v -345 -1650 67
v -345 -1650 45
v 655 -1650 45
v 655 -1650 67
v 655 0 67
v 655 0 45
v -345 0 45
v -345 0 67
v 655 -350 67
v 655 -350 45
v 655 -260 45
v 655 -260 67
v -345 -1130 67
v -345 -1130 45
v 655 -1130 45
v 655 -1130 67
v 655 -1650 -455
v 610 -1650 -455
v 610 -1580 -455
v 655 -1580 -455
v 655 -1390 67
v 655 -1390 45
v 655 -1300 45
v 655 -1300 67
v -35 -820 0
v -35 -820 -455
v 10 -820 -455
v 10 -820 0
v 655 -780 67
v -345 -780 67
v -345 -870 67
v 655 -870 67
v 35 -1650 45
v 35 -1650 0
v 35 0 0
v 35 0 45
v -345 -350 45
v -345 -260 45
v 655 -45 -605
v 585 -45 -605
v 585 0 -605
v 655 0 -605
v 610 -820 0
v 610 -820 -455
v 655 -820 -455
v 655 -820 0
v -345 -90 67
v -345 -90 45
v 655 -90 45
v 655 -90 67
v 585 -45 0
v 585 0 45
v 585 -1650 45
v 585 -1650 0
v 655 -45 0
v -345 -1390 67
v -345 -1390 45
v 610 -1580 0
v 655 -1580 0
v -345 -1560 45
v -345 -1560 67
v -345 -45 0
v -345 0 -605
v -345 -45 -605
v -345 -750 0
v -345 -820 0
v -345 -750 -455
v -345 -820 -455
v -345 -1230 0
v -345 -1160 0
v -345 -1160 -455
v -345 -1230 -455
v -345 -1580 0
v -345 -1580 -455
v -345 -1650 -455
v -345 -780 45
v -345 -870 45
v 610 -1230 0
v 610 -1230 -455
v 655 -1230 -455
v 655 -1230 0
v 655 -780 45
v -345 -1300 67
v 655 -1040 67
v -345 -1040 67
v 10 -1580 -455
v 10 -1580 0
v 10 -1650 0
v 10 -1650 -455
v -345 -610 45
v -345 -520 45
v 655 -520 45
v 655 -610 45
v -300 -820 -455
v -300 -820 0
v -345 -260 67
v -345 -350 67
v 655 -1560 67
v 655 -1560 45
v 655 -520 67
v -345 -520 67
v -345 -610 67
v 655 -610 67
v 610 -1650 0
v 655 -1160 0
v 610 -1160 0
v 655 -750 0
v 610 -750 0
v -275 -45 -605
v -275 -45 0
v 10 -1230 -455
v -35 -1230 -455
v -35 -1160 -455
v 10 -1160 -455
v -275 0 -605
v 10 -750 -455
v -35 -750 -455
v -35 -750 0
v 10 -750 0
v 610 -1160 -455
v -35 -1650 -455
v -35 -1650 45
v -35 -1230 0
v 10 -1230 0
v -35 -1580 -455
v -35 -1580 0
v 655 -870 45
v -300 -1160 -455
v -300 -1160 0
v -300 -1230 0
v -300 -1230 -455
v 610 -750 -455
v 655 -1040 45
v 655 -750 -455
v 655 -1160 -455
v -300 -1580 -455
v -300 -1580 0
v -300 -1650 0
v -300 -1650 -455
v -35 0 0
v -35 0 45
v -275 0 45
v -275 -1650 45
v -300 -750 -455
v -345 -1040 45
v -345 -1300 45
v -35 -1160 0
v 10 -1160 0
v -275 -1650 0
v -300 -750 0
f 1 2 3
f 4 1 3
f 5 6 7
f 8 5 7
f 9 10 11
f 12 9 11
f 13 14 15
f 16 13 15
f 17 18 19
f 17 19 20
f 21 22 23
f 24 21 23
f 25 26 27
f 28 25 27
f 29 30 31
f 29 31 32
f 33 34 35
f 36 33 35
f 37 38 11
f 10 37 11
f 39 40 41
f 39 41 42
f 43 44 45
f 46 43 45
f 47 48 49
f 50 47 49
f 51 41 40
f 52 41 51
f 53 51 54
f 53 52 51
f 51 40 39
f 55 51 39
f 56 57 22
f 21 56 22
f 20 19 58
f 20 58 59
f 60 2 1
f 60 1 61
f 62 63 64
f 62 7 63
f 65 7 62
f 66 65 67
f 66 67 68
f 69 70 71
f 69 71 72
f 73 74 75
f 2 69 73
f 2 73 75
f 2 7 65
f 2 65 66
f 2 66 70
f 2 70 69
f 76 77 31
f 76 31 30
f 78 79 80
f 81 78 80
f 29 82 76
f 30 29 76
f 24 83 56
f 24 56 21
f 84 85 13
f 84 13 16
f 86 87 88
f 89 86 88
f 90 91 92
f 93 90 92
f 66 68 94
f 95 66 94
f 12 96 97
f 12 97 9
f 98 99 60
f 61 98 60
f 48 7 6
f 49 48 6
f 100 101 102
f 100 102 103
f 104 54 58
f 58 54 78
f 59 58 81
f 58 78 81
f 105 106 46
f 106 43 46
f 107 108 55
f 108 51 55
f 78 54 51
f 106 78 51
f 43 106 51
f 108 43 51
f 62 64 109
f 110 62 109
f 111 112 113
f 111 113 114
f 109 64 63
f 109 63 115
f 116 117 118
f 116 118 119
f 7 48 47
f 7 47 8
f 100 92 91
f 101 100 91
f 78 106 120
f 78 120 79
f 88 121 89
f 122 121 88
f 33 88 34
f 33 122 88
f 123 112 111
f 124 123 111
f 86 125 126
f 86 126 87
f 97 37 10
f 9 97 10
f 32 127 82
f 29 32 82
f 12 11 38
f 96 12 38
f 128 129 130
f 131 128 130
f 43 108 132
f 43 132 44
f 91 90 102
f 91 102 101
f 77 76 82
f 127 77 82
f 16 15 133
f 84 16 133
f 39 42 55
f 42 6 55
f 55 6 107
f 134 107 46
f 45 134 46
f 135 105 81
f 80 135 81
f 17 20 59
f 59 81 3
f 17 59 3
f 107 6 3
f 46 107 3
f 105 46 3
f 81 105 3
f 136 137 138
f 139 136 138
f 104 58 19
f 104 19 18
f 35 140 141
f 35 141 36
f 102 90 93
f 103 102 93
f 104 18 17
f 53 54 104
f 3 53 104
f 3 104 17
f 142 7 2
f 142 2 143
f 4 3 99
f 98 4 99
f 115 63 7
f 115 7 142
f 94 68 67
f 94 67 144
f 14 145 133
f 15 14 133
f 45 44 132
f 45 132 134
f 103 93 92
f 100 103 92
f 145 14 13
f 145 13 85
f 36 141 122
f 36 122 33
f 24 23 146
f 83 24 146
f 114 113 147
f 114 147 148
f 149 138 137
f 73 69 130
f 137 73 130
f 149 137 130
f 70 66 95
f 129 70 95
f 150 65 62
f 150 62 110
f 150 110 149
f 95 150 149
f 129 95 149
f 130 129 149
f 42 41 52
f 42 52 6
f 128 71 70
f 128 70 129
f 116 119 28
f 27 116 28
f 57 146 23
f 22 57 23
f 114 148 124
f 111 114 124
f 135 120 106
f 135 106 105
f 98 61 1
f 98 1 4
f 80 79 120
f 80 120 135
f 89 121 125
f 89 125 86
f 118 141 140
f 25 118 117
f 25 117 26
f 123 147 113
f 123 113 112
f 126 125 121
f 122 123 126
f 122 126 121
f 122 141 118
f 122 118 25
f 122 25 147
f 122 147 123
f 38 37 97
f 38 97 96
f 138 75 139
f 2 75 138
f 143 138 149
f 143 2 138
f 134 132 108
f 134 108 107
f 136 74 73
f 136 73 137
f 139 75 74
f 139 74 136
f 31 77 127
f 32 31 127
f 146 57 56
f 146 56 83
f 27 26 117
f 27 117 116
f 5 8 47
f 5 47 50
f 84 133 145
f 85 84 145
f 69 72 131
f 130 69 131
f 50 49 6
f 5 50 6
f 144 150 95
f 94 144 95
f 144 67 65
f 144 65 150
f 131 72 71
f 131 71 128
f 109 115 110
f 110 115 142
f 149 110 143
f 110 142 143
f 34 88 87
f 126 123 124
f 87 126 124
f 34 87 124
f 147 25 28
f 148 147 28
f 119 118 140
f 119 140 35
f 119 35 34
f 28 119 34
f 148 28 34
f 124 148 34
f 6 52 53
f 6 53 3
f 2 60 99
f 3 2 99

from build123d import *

# Parameters (mm, degrees)
F0_W     = 70
F0_H     = 1650
F1_DEPTH = 45
F2_W     = 45
F2_H     = 70
F3_DEPTH = 455
F2_W_2   = 70
F2_H_2   = 45
F4_DEPTH = 605
F5_W     = 70
F5_H     = 90
F5_W_2   = 930
F6_DEPTH = 22


# Not quite as in the source:
# - a feature names something its author has since deleted; it is built from what else it names


with BuildPart() as f1:
    # F0 (on Top) → F1 (new body)
    with BuildSketch(Plane.XY):
        with Locations((0, -825)):
            Rectangle(F0_W, F0_H)
    extrude(amount=F1_DEPTH)

    # F2 (on face) → F3, piece 2 (join)
    with BuildSketch(Plane(origin=(0, 0, 0), x_dir=(1, 0, 0), z_dir=(0, 0, -1))):
        with Locations((-12.5, 785)):
            Rectangle(F2_W, F2_H)
        with Locations((-12.5, 1615)):
            Rectangle(F2_W, F2_H)
        with Locations((-12.5, 1195)):
            Rectangle(F2_W, F2_H)
    extrude(amount=F3_DEPTH)


with BuildPart() as f1b:
    # F0 (on Top) → F1, piece 2 (new body)
    with BuildSketch(Plane.XY):
        with Locations((620, -825)):
            Rectangle(F0_W, F0_H)
    extrude(amount=F1_DEPTH)

    # F2 (on face) → F3, piece 3 (join)
    with BuildSketch(Plane(origin=(0, 0, 0), x_dir=(1, 0, 0), z_dir=(0, 0, -1))):
        with Locations((632.5, 1615)):
            Rectangle(F2_W, F2_H)
        with Locations((632.5, 785)):
            Rectangle(F2_W, F2_H)
        with Locations((632.5, 1195)):
            Rectangle(F2_W, F2_H)
    extrude(amount=F3_DEPTH)

    # F2 (on face) → F4 (join)
    with BuildSketch(Plane(origin=(0, 0, 0), x_dir=(1, 0, 0), z_dir=(0, 0, -1))):
        with Locations((620, 22.5)):
            Rectangle(F2_W_2, F2_H_2)
    extrude(amount=F4_DEPTH)


with BuildPart() as f1c:
    # F0 (on Top) → F1, piece 3 (new body)
    with BuildSketch(Plane.XY):
        with Locations((-310, -825)):
            Rectangle(F0_W, F0_H)
    extrude(amount=F1_DEPTH)

    # F2 (on face) → F3 (join)
    with BuildSketch(Plane(origin=(0, 0, 0), x_dir=(1, 0, 0), z_dir=(0, 0, -1))):
        with Locations((-322.5, 785)):
            Rectangle(F2_W, F2_H)
        with Locations((-322.5, 1615)):
            Rectangle(F2_W, F2_H)
        with Locations((-322.5, 1195)):
            Rectangle(F2_W, F2_H)
    extrude(amount=F3_DEPTH)

    # F2 (on face) → F4, piece 2 (join)
    with BuildSketch(Plane(origin=(0, 0, 0), x_dir=(1, 0, 0), z_dir=(0, 0, -1))):
        with Locations((-310, 22.5)):
            Rectangle(F2_W_2, F2_H_2)
    extrude(amount=F4_DEPTH)


with BuildPart() as f6:
    # F5 (on face) → F6 (new body)
    with BuildSketch(Plane.XY.offset(45)):
        with Locations((-310, -1605)):
            Rectangle(F5_W, F5_H)
        with Locations((190, -1605)):
            Rectangle(F5_W_2, F5_H)
    extrude(amount=F6_DEPTH)


with BuildPart() as f6b:
    # F5 (on face) → F6, piece 2 (new body)
    with BuildSketch(Plane.XY.offset(45)):
        with Locations((-310, -1345)):
            Rectangle(F5_W, F5_H)
        with Locations((190, -1345)):
            Rectangle(F5_W_2, F5_H)
    extrude(amount=F6_DEPTH)


with BuildPart() as f6c:
    # F5 (on face) → F6, piece 3 (new body)
    with BuildSketch(Plane.XY.offset(45)):
        with Locations((-310, -1085)):
            Rectangle(F5_W, F5_H)
        with Locations((190, -1085)):
            Rectangle(F5_W_2, F5_H)
    extrude(amount=F6_DEPTH)


with BuildPart() as f6d:
    # F5 (on face) → F6, piece 4 (new body)
    with BuildSketch(Plane.XY.offset(45)):
        with Locations((-310, -825)):
            Rectangle(F5_W, F5_H)
        with Locations((190, -825)):
            Rectangle(F5_W_2, F5_H)
    extrude(amount=F6_DEPTH)


with BuildPart() as f6e:
    # F5 (on face) → F6, piece 5 (new body)
    with BuildSketch(Plane.XY.offset(45)):
        with Locations((-310, -565)):
            Rectangle(F5_W, F5_H)
        with Locations((190, -565)):
            Rectangle(F5_W_2, F5_H)
    extrude(amount=F6_DEPTH)


with BuildPart() as f6f:
    # F5 (on face) → F6, piece 6 (new body)
    with BuildSketch(Plane.XY.offset(45)):
        with Locations((-310, -305)):
            Rectangle(F5_W, F5_H)
        with Locations((190, -305)):
            Rectangle(F5_W_2, F5_H)
    extrude(amount=F6_DEPTH)


with BuildPart() as f6g:
    # F5 (on face) → F6, piece 7 (new body)
    with BuildSketch(Plane.XY.offset(45)):
        with Locations((-310, -45)):
            Rectangle(F5_W, F5_H)
        with Locations((190, -45)):
            Rectangle(F5_W_2, F5_H)
    extrude(amount=F6_DEPTH)


solid = Compound([f1.part, f1b.part, f1c.part, f6.part, f6b.part, f6c.part, f6d.part, f6e.part, f6f.part, f6g.part])
